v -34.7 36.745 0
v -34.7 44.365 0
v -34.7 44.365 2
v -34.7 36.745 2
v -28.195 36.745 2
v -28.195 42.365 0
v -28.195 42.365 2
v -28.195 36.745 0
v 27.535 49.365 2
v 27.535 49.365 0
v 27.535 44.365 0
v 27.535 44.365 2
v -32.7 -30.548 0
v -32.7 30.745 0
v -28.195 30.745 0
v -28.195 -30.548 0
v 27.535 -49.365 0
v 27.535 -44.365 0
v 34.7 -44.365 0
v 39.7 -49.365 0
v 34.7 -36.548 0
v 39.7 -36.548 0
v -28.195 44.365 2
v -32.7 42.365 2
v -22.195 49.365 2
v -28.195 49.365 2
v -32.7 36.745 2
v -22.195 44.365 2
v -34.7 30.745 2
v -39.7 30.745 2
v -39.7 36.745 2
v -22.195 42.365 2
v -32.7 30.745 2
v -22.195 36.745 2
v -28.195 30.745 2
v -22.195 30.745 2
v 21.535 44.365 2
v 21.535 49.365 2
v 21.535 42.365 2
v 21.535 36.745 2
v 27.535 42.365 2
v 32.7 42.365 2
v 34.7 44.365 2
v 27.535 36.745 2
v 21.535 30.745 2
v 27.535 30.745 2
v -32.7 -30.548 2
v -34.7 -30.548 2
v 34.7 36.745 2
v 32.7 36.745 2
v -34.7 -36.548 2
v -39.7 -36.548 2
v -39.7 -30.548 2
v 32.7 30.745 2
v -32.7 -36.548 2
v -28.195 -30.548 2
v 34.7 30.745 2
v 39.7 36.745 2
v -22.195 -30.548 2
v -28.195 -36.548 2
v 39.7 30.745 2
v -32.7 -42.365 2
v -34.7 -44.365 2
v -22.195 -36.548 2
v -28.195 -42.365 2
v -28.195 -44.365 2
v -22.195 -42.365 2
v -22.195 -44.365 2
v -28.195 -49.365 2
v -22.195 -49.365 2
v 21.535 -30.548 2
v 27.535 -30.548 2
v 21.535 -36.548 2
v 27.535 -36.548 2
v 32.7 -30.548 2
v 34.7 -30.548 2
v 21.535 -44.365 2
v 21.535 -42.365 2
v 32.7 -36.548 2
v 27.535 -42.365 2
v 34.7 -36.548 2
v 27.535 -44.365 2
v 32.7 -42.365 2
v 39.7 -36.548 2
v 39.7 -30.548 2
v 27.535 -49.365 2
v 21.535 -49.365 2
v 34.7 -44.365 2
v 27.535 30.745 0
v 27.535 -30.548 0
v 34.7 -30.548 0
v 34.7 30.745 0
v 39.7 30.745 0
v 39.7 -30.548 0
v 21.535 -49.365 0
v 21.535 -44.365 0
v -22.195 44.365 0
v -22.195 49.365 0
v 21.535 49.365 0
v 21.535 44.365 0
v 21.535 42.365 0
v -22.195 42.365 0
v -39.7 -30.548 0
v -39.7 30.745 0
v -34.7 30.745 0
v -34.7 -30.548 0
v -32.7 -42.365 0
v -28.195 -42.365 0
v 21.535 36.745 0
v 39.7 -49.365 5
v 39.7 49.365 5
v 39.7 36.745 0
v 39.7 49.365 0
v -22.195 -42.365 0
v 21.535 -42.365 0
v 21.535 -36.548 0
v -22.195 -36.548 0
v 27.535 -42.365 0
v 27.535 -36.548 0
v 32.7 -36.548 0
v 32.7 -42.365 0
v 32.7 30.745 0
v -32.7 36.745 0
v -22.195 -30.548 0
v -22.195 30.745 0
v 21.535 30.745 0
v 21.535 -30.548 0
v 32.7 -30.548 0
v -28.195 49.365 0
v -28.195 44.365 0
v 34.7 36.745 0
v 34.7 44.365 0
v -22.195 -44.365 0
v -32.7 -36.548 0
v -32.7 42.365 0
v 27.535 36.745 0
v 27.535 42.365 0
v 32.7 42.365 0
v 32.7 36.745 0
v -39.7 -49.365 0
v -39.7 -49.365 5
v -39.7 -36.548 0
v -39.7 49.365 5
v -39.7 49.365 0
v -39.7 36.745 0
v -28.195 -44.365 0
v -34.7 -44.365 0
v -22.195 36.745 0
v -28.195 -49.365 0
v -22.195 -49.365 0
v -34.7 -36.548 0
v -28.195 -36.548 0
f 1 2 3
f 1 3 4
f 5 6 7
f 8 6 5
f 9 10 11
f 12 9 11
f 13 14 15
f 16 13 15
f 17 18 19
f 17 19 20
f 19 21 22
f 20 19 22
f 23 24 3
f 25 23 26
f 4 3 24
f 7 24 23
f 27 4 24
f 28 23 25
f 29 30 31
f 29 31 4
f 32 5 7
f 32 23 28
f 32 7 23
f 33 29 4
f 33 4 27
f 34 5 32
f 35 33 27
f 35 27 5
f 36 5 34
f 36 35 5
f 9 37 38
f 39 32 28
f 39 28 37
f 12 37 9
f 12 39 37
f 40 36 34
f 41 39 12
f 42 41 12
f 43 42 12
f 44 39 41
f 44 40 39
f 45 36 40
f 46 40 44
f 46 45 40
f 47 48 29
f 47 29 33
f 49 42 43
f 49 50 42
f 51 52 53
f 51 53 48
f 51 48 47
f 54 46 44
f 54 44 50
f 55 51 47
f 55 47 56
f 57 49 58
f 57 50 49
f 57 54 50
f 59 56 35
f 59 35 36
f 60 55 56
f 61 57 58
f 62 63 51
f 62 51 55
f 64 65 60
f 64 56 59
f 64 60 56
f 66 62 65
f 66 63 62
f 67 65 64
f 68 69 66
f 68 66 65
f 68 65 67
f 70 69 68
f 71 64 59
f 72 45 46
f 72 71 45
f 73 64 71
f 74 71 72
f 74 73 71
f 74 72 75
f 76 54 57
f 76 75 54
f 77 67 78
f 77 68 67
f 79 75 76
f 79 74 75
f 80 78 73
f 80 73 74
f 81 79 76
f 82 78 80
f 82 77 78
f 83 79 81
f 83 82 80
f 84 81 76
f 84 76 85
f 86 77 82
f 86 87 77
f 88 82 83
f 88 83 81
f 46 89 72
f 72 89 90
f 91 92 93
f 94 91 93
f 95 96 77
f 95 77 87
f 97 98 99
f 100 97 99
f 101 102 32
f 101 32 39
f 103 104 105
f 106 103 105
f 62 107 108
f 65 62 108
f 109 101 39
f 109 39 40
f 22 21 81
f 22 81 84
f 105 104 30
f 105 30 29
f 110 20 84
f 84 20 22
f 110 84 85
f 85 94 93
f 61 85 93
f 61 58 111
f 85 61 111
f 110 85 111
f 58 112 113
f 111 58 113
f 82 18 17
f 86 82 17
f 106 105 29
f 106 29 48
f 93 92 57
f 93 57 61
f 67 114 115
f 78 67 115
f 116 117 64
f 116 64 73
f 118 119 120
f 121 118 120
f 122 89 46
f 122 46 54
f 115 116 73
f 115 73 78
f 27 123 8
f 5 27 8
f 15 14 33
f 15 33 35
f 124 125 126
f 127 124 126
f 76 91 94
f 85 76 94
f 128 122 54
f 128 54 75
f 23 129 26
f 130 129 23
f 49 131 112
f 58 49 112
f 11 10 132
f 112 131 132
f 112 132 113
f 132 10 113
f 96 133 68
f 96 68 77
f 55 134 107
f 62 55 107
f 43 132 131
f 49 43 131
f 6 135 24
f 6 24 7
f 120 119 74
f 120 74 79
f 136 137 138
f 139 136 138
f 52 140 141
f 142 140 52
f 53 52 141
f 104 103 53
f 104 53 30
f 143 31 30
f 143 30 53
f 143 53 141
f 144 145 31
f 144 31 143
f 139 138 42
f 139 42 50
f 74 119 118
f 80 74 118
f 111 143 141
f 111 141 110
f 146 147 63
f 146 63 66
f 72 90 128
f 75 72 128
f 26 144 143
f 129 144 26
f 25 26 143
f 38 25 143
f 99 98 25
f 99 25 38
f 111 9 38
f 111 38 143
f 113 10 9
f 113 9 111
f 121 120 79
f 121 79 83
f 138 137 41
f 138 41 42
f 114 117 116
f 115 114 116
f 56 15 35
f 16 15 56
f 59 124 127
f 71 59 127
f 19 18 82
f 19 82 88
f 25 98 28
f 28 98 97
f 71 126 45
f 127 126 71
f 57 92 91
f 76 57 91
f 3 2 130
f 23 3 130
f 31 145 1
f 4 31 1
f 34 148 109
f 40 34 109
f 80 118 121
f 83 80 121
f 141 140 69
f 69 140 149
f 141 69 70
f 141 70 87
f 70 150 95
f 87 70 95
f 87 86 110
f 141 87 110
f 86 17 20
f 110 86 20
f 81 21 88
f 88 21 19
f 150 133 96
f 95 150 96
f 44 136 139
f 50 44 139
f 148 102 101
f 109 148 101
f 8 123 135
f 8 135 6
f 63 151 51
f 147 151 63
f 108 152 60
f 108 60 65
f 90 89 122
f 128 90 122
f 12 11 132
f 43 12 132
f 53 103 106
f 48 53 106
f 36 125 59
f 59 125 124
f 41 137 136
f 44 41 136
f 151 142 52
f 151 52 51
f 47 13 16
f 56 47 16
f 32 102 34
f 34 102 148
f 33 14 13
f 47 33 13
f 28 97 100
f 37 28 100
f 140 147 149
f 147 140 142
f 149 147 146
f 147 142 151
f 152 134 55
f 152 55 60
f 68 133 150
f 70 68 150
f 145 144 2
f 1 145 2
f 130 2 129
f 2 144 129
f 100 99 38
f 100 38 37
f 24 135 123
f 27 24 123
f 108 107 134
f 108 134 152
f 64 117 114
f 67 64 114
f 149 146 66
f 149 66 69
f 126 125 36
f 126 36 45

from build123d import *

# Parameters (mm, degrees)
SKETCH_W        = 79.4
SKETCH_H        = 98.73
PAD_DEPTH       = 5
SKETCH002_W     = 69.4
SKETCH002_H     = 88.73
SKETCH002_W_2   = 65.4
SKETCH002_H_2   = 84.73
POCKET_DEPTH    = 2
SKETCH003_W     = 93.532375
SKETCH003_H     = 6
POCKET001_DEPTH = 2
SKETCH005_W     = 100.384567
SKETCH005_H     = 6
POCKET002_DEPTH = 2
SKETCH006_W     = 6
SKETCH006_H     = 113.061115
SKETCH006_H_2   = 111.176766
POCKET003_DEPTH = 2


with BuildPart() as part:
    # Sketch → Pad (new body)
    with BuildSketch(Plane.XY):
        Rectangle(SKETCH_W, SKETCH_H)
    extrude(amount=PAD_DEPTH)

    # Sketch002 → Pocket (cut)
    with BuildSketch(Plane(origin=(0, 0, 0), x_dir=(1, 0, 0), z_dir=(0, 0, -1))):
        Rectangle(SKETCH002_W, SKETCH002_H)
        Rectangle(SKETCH002_W_2, SKETCH002_H_2, mode=Mode.SUBTRACT)
    extrude(amount=-POCKET_DEPTH, mode=Mode.SUBTRACT)

    # Sketch003 (on Face16 of Pocket) → Pocket001 (cut)
    with BuildSketch(Plane(origin=(0, 0, 0), x_dir=(1, 0, 0), z_dir=(0, 0, -1))):
        with Locations((1.623375, 33.547611)):
            Rectangle(SKETCH003_W, SKETCH003_H)
    extrude(amount=-POCKET001_DEPTH, mode=Mode.SUBTRACT)

    # Sketch005 (on Face23 of Pocket001) → Pocket002 (cut)
    with BuildSketch(Plane(origin=(0, 0, 0), x_dir=(1, 0, 0), z_dir=(0, 0, -1))):
        with Locations((1.62792, -33.744774)):
            Rectangle(SKETCH005_W, SKETCH005_H)
    extrude(amount=-POCKET002_DEPTH, mode=Mode.SUBTRACT)

    # Sketch006 (on Face30 of Pocket002) → Pocket003 (cut)
    with BuildSketch(Plane(origin=(0, 0, 0), x_dir=(1, 0, 0), z_dir=(0, 0, -1))):
        with Locations((-25.195084, -4.192632)):
            Rectangle(SKETCH006_W, SKETCH006_H)
        with Locations((24.535048, -3.079151)):
            Rectangle(SKETCH006_W, SKETCH006_H_2)
    extrude(amount=-POCKET003_DEPTH, mode=Mode.SUBTRACT)


solid = part.part
